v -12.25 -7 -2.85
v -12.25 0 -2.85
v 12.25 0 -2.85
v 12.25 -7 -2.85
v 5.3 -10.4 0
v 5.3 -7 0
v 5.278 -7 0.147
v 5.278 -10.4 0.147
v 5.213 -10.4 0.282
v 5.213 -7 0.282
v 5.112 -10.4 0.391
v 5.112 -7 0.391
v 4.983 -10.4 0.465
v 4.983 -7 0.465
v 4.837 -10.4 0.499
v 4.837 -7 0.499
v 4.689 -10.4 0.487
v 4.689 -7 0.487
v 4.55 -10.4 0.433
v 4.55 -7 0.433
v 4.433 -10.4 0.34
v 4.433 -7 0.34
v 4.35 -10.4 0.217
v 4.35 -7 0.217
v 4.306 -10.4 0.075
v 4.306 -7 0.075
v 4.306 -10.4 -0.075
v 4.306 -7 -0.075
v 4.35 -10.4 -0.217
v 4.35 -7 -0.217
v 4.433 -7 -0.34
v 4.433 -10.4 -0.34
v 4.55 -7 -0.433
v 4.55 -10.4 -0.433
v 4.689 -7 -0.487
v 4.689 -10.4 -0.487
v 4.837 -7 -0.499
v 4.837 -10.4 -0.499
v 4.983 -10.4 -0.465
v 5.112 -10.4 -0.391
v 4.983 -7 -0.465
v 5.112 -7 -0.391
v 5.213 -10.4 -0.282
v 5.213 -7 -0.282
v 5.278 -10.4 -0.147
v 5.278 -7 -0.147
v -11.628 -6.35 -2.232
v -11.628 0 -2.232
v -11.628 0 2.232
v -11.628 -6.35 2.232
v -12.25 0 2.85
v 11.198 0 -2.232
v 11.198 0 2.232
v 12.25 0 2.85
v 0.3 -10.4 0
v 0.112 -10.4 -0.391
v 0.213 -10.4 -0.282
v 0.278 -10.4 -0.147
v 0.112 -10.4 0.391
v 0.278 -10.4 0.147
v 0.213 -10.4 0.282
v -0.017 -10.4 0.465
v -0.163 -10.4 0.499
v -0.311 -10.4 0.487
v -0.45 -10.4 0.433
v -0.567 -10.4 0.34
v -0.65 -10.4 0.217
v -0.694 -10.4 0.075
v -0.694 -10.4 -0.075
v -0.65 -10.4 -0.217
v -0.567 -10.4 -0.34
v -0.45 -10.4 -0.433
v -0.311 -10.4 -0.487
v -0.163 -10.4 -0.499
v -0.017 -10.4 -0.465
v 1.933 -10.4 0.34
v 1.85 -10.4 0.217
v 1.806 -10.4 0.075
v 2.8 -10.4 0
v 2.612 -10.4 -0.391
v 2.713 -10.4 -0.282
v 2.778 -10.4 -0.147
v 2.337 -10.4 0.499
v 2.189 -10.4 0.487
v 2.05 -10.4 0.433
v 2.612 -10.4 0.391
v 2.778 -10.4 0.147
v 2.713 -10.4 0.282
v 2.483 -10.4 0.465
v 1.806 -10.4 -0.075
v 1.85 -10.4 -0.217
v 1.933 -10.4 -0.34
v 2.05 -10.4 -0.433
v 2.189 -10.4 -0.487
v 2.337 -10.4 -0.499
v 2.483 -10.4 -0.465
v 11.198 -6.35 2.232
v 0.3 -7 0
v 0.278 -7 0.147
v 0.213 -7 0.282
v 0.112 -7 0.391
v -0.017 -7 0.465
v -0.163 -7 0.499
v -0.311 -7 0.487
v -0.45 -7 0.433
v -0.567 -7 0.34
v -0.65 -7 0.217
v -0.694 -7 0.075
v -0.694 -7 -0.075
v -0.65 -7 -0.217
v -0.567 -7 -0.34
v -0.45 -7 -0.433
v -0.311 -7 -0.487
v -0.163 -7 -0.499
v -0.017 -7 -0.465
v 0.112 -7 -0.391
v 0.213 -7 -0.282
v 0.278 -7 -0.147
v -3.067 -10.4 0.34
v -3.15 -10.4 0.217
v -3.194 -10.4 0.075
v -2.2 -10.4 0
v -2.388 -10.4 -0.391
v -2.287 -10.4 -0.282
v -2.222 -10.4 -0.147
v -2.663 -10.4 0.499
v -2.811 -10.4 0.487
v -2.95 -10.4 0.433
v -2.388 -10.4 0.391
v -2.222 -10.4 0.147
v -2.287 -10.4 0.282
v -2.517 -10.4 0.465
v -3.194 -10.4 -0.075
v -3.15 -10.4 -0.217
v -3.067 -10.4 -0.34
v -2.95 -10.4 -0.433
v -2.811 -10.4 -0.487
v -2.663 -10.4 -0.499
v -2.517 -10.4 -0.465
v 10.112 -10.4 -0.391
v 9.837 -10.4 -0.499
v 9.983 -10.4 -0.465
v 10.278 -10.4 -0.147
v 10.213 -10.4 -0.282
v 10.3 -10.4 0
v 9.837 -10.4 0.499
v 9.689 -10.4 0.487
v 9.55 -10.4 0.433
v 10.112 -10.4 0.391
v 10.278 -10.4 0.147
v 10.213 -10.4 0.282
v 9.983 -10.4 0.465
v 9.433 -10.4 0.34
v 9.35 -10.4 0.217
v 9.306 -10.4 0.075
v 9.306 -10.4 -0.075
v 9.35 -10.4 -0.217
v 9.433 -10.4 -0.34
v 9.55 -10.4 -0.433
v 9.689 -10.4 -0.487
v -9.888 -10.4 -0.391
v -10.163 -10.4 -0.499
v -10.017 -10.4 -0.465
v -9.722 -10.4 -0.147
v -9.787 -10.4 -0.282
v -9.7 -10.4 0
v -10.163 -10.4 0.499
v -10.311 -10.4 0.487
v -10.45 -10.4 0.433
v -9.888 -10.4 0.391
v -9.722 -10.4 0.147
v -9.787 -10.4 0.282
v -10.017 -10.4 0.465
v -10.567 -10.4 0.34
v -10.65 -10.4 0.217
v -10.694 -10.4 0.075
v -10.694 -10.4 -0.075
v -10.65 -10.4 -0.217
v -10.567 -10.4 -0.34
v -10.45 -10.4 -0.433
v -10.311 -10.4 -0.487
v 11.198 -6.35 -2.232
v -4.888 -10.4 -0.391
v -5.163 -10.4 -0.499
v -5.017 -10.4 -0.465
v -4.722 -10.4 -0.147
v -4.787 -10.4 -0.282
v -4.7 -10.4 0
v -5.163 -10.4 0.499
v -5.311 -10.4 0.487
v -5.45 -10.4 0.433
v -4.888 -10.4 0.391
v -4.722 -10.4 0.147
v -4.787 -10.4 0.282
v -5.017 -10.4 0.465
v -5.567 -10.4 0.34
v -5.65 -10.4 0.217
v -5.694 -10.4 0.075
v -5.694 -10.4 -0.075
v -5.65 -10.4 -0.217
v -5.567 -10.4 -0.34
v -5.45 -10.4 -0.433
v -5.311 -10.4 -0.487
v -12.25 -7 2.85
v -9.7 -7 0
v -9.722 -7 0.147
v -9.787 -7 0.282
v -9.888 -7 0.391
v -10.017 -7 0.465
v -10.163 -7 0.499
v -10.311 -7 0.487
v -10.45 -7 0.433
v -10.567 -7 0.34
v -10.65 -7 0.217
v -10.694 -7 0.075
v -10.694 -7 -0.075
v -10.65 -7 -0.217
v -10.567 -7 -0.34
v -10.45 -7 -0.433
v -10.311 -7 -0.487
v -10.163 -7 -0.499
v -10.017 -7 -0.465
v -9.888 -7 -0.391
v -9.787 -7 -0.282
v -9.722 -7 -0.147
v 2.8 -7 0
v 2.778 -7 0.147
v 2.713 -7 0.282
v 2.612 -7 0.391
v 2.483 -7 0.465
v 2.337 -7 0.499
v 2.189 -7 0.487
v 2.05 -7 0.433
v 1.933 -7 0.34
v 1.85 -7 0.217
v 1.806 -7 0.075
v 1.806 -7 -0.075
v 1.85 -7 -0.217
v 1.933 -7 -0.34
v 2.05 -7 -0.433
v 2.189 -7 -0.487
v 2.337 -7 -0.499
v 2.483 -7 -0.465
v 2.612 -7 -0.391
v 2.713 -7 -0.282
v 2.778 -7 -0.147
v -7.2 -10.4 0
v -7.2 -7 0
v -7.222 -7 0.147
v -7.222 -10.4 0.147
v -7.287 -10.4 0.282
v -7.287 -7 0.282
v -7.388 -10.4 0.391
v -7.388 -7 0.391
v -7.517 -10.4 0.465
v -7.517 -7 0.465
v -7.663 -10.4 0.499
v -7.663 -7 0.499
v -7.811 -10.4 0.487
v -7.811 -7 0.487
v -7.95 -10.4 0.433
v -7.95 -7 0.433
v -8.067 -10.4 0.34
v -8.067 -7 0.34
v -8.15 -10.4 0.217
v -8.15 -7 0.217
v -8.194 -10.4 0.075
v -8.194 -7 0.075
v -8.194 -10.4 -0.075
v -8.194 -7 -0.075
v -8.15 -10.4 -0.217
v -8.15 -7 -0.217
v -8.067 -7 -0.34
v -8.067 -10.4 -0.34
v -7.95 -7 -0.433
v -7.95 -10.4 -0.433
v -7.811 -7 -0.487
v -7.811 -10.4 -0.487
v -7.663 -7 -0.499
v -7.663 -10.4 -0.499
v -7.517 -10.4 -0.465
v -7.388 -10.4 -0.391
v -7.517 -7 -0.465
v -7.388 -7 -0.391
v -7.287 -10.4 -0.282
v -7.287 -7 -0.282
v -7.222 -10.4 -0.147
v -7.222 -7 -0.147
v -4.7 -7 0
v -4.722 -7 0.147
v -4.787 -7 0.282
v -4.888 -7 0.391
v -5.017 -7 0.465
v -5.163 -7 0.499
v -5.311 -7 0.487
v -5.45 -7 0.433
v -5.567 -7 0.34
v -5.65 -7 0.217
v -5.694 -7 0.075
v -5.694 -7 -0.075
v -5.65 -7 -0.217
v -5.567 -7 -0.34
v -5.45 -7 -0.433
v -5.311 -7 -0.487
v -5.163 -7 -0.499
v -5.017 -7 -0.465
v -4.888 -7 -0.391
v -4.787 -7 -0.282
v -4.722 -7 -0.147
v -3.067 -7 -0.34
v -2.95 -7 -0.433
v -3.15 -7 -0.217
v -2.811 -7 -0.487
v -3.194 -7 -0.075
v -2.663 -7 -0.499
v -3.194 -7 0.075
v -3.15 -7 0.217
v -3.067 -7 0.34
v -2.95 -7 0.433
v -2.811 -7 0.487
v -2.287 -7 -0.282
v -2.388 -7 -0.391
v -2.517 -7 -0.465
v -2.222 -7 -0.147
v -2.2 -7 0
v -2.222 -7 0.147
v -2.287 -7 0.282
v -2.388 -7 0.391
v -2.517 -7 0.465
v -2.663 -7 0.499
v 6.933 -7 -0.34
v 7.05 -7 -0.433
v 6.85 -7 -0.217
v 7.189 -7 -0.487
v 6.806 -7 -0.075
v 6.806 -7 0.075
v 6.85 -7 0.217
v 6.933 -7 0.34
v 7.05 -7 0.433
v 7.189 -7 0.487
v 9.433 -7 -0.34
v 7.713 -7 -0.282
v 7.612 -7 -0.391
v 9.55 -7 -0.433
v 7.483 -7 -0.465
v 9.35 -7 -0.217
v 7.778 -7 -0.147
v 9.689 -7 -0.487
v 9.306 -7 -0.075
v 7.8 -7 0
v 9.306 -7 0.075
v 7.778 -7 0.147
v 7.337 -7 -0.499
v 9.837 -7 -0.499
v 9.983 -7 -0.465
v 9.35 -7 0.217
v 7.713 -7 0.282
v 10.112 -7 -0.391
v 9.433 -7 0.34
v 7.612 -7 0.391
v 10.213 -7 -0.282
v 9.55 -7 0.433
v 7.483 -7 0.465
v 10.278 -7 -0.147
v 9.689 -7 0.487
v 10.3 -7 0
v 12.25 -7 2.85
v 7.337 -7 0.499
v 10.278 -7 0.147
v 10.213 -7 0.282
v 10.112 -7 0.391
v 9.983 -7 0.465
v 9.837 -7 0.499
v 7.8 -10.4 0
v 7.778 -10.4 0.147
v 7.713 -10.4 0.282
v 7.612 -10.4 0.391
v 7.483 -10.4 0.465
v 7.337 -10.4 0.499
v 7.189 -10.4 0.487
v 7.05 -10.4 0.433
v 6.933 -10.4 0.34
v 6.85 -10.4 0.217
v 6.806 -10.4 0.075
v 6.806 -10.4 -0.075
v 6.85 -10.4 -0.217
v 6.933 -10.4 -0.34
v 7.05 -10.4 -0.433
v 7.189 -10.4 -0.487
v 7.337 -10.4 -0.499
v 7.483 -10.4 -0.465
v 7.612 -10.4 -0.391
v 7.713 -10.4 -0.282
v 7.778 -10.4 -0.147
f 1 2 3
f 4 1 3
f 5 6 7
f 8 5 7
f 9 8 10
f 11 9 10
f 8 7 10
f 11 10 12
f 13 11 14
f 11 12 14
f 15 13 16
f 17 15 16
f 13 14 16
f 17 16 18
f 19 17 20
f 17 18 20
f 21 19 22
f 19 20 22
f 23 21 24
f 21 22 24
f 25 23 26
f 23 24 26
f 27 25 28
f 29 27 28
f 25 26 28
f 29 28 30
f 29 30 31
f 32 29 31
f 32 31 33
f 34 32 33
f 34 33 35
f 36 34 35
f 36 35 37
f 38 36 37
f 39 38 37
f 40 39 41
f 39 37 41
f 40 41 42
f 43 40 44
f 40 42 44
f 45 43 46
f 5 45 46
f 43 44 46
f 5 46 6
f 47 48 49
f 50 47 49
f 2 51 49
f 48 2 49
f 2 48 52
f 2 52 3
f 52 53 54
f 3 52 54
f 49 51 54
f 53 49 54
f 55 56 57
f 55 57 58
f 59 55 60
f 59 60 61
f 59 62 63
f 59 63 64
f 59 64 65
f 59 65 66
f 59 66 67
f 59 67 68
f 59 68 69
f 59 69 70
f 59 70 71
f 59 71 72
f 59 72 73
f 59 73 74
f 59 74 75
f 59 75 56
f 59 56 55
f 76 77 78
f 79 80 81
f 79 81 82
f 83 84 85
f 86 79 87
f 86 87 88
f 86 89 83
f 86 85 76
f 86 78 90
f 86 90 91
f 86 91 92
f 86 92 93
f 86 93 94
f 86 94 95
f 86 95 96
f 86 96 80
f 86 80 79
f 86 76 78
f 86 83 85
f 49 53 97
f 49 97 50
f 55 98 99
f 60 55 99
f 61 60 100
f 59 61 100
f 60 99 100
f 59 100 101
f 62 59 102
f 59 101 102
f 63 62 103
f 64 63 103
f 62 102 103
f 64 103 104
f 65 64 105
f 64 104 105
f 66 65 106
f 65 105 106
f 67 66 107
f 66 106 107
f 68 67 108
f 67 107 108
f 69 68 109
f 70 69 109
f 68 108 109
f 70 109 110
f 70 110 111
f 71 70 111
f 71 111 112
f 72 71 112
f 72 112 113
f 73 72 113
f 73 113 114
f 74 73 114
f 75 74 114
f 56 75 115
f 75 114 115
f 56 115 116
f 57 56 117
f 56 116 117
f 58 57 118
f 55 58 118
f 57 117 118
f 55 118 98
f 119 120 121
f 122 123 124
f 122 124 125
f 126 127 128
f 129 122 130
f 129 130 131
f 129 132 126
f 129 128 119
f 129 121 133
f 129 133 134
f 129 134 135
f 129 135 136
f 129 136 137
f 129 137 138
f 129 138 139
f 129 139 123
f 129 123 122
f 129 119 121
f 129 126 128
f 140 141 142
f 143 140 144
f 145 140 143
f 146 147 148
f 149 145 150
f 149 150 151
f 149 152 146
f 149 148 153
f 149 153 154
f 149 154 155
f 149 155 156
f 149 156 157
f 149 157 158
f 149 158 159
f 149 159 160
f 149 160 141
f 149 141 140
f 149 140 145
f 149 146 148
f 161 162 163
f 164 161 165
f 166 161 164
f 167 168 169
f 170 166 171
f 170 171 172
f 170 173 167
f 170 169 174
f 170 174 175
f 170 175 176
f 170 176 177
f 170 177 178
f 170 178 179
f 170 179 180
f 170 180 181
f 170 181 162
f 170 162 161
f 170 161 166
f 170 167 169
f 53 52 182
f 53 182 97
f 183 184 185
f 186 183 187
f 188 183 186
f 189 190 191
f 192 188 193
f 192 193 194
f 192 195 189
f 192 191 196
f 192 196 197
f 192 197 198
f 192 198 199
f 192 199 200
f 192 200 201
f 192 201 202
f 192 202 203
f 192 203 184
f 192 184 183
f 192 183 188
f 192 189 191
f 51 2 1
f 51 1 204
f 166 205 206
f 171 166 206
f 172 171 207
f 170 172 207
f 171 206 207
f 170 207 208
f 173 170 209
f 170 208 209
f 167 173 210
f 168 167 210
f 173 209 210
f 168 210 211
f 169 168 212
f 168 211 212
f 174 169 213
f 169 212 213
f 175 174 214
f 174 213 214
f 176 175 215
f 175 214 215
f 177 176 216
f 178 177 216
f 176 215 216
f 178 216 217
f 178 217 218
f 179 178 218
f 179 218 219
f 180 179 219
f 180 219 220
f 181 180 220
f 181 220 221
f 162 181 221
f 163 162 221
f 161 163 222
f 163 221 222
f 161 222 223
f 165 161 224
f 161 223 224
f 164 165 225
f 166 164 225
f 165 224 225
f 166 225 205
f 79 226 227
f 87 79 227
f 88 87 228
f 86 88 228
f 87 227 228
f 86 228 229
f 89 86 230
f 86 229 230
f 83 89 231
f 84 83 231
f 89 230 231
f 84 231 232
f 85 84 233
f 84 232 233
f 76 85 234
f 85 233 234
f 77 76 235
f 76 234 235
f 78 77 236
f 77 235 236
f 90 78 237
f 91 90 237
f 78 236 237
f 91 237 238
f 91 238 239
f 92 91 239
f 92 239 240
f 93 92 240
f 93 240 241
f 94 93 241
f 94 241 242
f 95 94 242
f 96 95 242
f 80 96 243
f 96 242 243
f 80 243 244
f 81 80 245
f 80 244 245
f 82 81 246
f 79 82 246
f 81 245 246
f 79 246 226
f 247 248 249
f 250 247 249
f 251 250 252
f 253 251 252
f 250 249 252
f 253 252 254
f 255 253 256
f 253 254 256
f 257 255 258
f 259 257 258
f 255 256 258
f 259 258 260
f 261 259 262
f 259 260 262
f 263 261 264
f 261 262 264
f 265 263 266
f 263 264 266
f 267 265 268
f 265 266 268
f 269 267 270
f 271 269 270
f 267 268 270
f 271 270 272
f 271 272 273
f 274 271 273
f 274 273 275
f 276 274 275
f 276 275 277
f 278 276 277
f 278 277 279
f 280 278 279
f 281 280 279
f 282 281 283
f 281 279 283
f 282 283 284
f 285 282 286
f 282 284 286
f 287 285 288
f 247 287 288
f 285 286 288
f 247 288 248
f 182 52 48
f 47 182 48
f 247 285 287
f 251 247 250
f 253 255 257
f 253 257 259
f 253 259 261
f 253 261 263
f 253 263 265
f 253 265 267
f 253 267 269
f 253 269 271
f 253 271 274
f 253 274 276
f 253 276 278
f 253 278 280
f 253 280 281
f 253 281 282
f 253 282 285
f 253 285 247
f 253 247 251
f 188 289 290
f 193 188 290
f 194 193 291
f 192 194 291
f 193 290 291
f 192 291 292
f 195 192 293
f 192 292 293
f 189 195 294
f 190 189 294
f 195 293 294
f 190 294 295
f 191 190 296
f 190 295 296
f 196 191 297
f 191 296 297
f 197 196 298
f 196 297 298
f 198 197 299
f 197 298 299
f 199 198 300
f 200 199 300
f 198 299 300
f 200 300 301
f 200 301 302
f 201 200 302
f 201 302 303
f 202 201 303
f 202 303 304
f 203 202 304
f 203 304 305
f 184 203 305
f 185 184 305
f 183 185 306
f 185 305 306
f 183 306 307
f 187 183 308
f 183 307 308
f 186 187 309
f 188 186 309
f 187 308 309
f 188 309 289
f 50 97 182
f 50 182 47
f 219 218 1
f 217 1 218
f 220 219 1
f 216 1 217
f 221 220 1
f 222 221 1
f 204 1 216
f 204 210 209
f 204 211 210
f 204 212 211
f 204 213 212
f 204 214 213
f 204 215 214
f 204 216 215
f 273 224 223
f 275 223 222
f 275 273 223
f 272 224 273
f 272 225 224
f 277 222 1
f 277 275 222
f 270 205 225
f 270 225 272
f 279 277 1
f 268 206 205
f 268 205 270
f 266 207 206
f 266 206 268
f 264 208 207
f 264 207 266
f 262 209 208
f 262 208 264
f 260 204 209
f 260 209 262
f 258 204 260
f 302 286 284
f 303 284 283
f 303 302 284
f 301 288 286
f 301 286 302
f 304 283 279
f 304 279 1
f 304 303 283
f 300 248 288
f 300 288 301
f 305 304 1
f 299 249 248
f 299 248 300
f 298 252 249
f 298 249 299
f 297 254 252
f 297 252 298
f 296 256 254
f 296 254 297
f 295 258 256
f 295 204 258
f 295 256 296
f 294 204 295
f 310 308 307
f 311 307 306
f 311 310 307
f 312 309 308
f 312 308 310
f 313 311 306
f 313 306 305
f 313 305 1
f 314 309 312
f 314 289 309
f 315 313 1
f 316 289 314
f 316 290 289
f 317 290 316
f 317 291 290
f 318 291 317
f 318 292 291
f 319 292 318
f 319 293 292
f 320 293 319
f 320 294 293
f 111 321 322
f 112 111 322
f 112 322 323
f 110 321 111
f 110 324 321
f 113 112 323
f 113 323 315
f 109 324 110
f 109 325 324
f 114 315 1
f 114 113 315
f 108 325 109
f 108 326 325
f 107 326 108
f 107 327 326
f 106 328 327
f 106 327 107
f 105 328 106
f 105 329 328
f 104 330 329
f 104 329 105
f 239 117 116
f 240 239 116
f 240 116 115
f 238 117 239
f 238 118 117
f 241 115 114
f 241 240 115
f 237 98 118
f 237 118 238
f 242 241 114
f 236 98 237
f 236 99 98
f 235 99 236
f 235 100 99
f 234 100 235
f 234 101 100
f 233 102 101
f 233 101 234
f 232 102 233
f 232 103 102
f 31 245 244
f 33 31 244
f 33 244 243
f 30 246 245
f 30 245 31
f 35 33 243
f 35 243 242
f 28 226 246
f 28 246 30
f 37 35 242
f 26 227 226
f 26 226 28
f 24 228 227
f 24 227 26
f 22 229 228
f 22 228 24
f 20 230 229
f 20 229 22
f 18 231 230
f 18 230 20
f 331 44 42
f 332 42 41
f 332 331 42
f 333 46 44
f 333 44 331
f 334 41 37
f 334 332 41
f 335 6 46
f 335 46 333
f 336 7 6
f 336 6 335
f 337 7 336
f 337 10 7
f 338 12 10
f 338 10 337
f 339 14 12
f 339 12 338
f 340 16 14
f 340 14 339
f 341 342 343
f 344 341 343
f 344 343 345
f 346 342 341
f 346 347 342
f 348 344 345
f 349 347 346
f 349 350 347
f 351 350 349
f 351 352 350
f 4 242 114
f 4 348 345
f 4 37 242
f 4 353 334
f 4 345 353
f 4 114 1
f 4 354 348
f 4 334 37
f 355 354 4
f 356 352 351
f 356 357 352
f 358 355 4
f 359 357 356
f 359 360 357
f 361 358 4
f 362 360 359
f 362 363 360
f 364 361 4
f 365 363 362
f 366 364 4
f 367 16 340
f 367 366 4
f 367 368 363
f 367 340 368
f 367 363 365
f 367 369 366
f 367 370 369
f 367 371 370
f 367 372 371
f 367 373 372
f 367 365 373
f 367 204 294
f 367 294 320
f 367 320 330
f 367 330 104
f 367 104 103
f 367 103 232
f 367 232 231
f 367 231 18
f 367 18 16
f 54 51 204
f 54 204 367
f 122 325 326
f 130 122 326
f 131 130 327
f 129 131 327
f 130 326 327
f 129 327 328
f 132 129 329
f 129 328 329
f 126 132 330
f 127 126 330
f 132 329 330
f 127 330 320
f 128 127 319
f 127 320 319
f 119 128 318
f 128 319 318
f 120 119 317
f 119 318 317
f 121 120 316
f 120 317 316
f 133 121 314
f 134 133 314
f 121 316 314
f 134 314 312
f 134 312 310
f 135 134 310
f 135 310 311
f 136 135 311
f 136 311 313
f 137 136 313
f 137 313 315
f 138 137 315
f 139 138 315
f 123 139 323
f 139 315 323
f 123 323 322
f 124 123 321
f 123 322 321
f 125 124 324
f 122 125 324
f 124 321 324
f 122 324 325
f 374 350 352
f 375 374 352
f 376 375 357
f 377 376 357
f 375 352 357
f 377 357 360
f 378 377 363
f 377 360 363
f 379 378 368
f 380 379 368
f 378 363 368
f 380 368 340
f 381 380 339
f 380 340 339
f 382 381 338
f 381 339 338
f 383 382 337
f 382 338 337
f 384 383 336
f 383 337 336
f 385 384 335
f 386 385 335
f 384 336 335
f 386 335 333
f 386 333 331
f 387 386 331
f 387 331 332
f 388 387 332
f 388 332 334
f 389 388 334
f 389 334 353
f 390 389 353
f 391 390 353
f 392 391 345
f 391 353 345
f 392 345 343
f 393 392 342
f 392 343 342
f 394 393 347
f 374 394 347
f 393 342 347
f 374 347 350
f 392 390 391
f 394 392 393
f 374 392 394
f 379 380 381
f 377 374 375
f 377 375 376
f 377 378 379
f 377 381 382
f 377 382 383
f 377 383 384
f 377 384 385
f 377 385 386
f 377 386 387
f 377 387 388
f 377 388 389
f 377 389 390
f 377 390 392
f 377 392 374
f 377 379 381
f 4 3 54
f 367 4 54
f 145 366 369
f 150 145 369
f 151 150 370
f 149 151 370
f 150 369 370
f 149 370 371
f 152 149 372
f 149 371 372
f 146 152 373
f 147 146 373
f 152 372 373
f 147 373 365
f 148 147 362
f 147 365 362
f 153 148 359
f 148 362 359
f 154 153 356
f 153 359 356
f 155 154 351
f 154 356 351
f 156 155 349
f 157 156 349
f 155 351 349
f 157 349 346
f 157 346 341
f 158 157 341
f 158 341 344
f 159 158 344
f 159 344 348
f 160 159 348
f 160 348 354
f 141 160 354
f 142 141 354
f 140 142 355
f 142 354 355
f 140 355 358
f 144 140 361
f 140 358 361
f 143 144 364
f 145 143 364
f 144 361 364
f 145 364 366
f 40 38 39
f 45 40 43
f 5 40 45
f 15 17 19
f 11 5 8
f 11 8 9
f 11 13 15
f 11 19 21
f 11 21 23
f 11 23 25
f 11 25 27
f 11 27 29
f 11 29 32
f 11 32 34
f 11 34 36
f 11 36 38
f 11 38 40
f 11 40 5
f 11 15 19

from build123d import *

# Parameters (mm, degrees)
F0_W     = 24.5
F0_H     = 5.7
F1_DEPTH = 7
F2_R     = 0.5
F3_DEPTH = 3.4
F4_W     = 22.82576
F4_H     = 4.464458
F5_DEPTH = 6.35


with BuildPart() as f1:
    # F0 (on Front) → F1 (new body)
    with BuildSketch(Plane.XZ):
        Rectangle(F0_W, F0_H)
    extrude(amount=F1_DEPTH)

    # F2 (on face) → F3 (join)
    with BuildSketch(Plane.XZ.offset(7)):
        with Locations((9.8, 0)):
            Circle(F2_R)
        with Locations((7.3, 0)):
            Circle(F2_R)
        with Locations((4.8, 0)):
            Circle(F2_R)
        with Locations((2.3, 0)):
            Circle(F2_R)
        with Locations((-0.2, 0)):
            Circle(F2_R)
        with Locations((-2.7, 0)):
            Circle(F2_R)
        with Locations((-5.2, 0)):
            Circle(F2_R)
        with Locations((-7.7, 0)):
            Circle(F2_R)
        with Locations((-10.2, 0)):
            Circle(F2_R)
    extrude(amount=F3_DEPTH)

    # F4 (on face) → F5 (cut)
    with BuildSketch(Plane(origin=(0, 0, 0), x_dir=(-1, 0, 0), z_dir=(0, 1, 0))):
        with Locations((0.214789, 0)):
            Rectangle(F4_W, F4_H)
    extrude(amount=-F5_DEPTH, mode=Mode.SUBTRACT)


solid = f1.part
